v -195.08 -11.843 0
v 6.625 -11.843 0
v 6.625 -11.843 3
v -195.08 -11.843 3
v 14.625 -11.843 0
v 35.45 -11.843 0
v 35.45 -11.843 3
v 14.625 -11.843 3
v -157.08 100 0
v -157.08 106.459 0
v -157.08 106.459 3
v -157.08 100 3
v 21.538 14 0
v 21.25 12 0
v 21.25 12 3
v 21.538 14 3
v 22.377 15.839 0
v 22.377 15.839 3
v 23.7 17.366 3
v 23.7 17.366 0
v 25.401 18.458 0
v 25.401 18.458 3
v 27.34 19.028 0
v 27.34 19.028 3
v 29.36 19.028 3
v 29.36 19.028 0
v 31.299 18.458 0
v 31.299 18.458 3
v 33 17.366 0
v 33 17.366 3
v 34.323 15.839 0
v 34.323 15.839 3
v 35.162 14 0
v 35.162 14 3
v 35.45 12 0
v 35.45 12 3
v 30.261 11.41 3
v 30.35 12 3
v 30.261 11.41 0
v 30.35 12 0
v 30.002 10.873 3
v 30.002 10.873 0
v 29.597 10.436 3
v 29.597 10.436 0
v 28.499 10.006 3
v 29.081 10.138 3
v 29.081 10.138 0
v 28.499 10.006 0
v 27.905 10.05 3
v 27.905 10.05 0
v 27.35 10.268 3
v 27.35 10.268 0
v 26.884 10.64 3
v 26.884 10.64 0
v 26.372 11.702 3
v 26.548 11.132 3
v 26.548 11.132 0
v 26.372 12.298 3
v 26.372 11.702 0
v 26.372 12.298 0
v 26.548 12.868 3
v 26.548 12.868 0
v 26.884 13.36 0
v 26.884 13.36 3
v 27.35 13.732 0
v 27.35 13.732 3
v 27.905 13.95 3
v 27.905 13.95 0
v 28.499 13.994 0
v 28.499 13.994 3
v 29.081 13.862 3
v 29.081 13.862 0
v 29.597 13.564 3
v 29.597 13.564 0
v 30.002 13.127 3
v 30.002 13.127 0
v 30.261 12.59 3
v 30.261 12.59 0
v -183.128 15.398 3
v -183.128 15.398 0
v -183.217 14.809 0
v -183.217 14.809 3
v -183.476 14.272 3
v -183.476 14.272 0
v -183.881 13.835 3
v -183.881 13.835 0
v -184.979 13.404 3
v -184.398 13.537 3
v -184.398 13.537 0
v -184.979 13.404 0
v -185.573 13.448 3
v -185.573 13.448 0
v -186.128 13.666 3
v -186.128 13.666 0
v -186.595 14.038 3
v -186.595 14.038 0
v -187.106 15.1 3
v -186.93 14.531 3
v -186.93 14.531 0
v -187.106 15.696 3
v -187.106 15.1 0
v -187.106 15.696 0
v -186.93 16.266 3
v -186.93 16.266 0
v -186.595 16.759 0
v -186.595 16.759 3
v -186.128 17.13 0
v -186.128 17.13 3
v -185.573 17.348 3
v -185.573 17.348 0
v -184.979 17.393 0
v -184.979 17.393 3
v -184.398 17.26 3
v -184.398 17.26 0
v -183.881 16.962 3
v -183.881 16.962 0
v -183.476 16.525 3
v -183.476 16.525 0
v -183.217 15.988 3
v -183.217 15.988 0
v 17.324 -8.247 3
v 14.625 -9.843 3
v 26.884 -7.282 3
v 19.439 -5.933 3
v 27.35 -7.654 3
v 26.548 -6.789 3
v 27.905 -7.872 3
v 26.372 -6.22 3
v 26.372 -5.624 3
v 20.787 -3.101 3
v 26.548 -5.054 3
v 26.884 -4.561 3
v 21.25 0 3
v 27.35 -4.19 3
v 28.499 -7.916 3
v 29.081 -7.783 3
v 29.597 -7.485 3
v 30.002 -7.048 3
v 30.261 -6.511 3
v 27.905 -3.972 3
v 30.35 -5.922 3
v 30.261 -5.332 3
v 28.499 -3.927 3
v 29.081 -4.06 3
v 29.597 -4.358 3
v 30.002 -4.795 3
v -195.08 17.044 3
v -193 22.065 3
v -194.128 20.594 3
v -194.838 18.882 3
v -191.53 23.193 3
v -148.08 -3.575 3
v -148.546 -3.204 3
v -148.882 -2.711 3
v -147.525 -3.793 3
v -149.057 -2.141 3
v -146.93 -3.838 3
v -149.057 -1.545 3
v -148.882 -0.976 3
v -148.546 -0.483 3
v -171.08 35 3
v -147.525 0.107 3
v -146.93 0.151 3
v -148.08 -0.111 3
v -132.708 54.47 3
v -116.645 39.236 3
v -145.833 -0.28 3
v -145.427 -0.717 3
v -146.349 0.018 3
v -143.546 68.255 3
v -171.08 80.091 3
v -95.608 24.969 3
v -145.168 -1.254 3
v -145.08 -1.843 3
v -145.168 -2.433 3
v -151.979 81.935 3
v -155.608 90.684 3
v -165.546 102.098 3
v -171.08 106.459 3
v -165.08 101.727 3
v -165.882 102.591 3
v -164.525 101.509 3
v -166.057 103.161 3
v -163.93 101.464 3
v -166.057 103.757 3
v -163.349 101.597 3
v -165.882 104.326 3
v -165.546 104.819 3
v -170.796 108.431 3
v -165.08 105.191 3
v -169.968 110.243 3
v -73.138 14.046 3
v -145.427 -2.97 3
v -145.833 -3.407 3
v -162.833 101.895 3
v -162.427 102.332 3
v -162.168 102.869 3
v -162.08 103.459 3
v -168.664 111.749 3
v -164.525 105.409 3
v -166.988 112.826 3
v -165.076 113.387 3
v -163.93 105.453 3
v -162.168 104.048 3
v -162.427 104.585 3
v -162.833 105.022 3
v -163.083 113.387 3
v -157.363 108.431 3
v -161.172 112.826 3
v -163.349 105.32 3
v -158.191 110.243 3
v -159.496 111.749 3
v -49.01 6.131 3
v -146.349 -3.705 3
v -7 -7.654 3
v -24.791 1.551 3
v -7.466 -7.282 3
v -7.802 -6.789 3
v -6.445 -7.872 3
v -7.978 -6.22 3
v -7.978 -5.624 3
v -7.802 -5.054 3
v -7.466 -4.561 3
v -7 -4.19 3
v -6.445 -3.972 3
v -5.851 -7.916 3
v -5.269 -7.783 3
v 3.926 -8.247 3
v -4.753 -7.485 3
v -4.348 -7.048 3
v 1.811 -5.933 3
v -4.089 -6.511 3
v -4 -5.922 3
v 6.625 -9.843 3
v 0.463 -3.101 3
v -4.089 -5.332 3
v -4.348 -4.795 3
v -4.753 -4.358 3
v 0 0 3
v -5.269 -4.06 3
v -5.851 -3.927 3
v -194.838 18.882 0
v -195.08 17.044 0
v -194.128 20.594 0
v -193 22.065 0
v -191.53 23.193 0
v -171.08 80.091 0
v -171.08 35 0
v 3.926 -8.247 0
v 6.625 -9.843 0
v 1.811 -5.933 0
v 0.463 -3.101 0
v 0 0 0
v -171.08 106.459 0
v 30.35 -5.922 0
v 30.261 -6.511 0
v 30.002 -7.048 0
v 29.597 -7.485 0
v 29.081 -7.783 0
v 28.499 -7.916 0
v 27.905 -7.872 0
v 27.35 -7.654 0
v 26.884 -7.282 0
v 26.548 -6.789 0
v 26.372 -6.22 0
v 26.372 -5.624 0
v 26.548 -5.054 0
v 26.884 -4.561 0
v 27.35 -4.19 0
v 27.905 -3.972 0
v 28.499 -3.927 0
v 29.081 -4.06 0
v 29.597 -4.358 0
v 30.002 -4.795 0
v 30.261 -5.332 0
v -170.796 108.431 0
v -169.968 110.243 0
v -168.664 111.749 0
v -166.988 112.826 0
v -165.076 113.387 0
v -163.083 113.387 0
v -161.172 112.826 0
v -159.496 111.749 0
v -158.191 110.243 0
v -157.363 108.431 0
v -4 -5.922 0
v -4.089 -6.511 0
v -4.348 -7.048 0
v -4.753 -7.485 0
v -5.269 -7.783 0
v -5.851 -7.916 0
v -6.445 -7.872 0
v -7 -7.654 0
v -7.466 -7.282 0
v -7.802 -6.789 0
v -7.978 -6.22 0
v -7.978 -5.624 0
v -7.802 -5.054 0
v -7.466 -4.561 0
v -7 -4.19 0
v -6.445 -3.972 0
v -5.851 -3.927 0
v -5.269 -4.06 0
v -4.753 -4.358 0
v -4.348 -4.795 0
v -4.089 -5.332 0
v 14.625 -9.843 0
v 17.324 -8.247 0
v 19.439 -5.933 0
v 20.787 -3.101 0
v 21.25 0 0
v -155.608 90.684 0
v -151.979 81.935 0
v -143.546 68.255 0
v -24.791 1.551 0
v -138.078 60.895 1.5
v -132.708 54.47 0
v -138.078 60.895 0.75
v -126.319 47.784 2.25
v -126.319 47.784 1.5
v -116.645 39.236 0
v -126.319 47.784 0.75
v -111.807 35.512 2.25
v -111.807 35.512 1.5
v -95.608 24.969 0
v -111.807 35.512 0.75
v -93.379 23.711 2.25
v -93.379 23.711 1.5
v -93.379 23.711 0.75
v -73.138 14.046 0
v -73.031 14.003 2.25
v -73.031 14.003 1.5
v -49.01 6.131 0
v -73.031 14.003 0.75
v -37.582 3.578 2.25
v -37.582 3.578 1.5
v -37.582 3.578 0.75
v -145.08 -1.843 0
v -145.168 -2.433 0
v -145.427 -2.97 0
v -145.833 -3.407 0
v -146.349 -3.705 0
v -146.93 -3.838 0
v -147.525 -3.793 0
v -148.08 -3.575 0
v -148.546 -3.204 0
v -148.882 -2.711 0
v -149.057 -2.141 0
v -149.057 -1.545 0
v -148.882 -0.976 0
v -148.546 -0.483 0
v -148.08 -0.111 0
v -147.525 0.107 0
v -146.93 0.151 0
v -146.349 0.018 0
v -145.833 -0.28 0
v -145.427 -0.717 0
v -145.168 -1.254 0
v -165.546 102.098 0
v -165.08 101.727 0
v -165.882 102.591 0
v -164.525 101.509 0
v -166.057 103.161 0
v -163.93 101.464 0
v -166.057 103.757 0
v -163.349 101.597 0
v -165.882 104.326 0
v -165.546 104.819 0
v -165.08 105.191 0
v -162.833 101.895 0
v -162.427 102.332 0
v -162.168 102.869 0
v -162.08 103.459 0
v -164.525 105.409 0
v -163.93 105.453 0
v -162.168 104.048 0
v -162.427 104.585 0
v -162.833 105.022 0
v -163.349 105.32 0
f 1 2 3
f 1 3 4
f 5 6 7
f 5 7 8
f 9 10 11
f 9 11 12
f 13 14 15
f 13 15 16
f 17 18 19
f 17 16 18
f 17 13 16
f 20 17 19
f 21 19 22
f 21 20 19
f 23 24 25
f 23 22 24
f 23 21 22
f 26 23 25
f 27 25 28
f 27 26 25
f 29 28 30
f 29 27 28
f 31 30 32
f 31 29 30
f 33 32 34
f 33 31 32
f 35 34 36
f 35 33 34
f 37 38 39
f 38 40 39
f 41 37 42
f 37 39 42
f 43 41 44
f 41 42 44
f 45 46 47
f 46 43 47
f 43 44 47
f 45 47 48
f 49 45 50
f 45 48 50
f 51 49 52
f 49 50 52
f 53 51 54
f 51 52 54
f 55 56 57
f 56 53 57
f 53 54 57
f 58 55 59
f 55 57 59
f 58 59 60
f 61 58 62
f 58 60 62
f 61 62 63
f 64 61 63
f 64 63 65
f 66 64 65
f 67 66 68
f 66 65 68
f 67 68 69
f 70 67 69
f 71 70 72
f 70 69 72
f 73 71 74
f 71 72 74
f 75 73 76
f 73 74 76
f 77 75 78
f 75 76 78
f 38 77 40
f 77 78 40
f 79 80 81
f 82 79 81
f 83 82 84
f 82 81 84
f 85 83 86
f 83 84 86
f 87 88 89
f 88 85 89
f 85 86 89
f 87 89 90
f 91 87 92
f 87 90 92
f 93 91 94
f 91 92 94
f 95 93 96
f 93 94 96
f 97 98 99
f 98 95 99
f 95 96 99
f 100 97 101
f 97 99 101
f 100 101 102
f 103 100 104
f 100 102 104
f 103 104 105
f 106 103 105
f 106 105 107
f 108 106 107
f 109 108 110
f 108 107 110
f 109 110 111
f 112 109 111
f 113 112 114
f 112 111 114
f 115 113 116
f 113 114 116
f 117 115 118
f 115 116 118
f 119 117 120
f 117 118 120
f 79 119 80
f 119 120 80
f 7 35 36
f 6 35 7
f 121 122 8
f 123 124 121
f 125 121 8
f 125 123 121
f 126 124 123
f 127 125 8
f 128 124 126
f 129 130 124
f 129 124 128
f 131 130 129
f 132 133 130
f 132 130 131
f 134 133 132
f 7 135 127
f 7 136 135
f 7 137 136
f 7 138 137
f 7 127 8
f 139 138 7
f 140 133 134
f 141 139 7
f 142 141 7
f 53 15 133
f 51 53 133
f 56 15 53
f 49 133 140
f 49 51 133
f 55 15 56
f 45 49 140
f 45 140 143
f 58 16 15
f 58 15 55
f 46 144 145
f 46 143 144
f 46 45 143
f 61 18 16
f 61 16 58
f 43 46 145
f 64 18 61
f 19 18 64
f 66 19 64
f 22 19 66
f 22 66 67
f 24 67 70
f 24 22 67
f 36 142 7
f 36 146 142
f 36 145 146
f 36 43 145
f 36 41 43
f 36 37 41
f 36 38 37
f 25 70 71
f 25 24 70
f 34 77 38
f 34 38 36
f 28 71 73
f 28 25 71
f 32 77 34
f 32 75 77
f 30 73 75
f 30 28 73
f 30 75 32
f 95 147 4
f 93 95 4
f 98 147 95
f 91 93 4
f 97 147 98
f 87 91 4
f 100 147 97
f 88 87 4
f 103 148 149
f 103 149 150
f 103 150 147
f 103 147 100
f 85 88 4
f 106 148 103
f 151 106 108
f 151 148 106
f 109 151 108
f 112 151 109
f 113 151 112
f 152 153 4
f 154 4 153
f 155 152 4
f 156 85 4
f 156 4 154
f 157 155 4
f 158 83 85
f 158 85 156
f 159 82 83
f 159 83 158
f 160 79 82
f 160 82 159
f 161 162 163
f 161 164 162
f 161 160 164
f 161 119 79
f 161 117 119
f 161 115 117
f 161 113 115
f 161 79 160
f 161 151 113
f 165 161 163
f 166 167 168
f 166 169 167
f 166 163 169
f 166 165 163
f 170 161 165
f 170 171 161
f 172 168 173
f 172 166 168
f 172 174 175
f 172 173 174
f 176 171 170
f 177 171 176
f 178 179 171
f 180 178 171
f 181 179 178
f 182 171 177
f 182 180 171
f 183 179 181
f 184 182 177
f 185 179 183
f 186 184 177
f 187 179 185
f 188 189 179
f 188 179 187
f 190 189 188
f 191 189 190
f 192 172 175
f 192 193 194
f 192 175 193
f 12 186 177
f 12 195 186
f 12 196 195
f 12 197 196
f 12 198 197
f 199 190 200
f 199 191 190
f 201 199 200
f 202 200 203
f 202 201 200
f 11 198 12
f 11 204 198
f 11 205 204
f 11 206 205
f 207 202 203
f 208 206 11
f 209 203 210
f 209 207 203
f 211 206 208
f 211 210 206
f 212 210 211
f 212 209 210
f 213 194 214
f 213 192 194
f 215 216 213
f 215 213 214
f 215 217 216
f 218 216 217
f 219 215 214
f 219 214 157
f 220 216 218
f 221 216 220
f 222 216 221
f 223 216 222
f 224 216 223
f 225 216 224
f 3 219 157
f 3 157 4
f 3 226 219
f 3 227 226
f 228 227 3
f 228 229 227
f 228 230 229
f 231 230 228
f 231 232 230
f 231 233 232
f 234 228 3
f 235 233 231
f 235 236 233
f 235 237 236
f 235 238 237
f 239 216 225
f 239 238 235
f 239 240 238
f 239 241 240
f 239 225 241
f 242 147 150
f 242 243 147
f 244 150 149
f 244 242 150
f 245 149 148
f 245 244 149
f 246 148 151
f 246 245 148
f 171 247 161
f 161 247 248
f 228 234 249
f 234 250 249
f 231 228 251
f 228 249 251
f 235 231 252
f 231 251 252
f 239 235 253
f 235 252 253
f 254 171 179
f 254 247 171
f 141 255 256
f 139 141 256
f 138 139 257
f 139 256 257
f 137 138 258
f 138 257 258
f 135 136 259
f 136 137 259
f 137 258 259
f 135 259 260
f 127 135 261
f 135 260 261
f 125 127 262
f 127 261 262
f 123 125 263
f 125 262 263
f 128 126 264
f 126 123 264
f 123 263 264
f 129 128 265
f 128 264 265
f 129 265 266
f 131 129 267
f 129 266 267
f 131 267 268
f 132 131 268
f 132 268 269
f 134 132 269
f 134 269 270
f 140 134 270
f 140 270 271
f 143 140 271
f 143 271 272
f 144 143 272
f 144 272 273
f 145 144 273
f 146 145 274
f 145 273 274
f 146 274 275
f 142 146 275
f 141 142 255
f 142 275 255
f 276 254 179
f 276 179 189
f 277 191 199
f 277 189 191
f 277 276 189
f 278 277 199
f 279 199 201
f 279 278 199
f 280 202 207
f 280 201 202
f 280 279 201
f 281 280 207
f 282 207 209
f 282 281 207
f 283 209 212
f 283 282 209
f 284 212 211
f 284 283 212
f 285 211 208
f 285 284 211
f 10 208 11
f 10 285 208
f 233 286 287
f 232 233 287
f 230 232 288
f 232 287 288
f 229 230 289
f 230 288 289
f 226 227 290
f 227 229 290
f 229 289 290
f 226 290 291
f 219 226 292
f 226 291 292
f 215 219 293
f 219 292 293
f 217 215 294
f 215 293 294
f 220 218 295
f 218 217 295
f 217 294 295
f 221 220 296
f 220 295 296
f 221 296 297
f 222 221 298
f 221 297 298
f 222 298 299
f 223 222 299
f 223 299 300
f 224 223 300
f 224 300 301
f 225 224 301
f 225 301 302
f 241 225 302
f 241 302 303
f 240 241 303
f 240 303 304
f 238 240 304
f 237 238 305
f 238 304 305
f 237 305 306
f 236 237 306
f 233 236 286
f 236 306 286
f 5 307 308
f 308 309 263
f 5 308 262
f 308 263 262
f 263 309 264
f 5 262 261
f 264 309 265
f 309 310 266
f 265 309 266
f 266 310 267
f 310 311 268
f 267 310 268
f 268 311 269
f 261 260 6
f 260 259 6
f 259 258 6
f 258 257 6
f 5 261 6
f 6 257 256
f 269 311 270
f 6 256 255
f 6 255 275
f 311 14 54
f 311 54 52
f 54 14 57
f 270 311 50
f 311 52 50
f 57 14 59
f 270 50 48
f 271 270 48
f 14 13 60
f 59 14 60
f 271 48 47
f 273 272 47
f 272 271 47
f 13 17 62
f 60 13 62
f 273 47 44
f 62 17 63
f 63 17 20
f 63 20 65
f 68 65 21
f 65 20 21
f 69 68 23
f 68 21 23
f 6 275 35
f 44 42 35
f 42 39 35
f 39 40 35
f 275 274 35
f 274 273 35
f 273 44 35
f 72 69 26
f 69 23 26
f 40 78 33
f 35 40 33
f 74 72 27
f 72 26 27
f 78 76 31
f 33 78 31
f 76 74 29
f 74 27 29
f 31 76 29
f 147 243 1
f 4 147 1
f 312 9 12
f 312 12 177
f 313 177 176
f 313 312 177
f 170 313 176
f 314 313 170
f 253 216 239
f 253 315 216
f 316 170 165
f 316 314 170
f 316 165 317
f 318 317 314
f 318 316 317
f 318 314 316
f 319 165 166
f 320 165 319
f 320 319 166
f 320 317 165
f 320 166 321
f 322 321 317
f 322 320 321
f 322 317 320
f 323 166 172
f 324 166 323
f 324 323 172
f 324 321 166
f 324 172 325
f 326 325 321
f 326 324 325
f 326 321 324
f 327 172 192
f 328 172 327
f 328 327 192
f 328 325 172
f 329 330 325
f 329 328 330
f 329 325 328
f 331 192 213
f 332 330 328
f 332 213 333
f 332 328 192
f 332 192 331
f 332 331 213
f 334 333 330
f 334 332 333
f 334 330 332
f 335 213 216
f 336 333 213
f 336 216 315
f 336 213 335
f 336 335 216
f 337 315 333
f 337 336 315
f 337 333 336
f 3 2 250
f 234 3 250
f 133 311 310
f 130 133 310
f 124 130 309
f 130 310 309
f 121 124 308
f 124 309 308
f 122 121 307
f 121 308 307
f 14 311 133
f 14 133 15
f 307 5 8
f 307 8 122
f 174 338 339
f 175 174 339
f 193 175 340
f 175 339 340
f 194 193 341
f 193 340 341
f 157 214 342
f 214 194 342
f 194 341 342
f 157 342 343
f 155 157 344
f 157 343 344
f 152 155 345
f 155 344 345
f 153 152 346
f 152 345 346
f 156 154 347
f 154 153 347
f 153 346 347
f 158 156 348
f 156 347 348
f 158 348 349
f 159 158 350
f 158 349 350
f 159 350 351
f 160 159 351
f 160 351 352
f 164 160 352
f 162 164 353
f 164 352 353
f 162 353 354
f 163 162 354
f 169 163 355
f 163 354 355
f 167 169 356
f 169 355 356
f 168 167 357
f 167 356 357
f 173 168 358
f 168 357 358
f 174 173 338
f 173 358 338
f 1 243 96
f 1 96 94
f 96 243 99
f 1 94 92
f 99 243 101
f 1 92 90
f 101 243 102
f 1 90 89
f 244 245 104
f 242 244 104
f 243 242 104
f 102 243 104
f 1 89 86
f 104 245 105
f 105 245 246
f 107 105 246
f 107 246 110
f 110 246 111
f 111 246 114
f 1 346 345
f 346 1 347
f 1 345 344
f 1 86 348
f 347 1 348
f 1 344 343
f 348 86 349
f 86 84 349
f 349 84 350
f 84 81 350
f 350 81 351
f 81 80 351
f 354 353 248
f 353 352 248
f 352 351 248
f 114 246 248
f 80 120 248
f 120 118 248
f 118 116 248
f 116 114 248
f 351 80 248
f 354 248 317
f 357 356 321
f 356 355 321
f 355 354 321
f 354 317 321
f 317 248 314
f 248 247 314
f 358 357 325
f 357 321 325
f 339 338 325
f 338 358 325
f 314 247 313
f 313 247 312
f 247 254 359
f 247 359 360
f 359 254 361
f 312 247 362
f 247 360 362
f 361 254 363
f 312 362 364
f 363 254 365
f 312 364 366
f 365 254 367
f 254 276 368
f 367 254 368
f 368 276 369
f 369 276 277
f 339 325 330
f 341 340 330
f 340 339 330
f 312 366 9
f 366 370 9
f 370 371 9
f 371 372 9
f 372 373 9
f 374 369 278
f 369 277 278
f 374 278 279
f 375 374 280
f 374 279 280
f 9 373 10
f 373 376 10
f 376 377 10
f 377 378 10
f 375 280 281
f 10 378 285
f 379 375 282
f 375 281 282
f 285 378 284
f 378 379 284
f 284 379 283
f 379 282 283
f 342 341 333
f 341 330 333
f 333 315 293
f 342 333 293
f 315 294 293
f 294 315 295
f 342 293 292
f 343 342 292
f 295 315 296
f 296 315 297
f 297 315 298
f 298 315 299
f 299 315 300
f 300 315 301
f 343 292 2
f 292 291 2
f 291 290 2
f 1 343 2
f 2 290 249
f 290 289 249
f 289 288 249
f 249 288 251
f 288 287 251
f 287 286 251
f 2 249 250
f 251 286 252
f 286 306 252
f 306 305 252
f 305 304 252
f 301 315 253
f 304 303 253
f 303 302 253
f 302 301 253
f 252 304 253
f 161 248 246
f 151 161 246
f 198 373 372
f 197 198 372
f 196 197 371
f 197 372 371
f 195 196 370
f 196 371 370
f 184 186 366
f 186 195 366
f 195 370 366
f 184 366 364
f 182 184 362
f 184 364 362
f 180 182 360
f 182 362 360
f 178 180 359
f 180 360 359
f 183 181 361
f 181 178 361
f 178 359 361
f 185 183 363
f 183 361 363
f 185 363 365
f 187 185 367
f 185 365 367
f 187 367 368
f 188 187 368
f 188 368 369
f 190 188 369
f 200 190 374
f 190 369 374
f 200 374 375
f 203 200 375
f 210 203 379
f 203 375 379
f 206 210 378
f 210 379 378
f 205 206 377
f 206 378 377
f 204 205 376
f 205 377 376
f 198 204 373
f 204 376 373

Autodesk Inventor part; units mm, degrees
ref_plane "YZ Plane" through (0, 0, 0) normal (1, 0, 0) x (0, 1, 0)
ref_plane "XZ Plane" through (0, 0, 0) normal (0, 1, 0) x (-1, 0, 0)
ref_plane "XY Plane" through (0, 0, 0) normal (0, 0, 1) x (1, 0, 0)
sketch "Sketch3" plane through (0, 0, 0) normal (0, 0, 1) x (1, 0, 0)
  circle A0 centre (367.816, 50) radius 50 construction
  line L0 (367.816, 0) -> (512.7041, 0) construction
  line L1 (367.816, 50) -> (512.7041, 50) construction
  line L2 (367.816, 100) -> (512.7041, 100) construction
  line L3 (367.816, 50) -> (342.816, 6.6987) construction
  line L4 (367.816, 50) -> (324.5147, 25) construction
  line L5 (367.816, 50) -> (324.5147, 75) construction
  line L6 (342.816, 93.3013) -> (367.816, 50) construction
  line L7 (392.816, 93.3013) -> (367.816, 50) construction
  line L8 (411.1173, 75) -> (367.816, 50) construction
  line L9 (411.1173, 25) -> (367.816, 50) construction
  line L10 (392.816, 6.6987) -> (367.816, 50) construction
  line L11 (367.816, 0) -> (367.816, 100) construction
  line L12 (417.816, 50) -> (367.816, 50) construction
  line L13 (341.6361, 0) -> (341.6361, 100) construction
  line L14 (315.4561, 0) -> (315.4561, 100) construction
  line L15 (289.2762, 0) -> (289.2762, 100) construction
  line L16 (263.0963, 0) -> (263.0963, 100) construction
  line L17 (236.9163, 0) -> (236.9163, 100) construction
  line L18 (210.7364, 0) -> (210.7364, 100) construction
  line L19 (184.5564, 0) -> (184.5564, 100) construction
  line L20 (158.3765, 0) -> (158.3765, 100) construction
  circle A1 centre (315.4561, 50) radius 50 construction
  circle A2 centre (341.6361, 50) radius 50 construction
  circle A3 centre (289.2762, 50) radius 50 construction
  circle A4 centre (263.0963, 50) radius 50 construction
  circle A5 centre (236.9163, 50) radius 50 construction
  circle A6 centre (210.7364, 50) radius 50 construction
  line L21 (392.816, 6.6987) -> (512.7041, 6.6987) construction
  line L22 (411.1173, 25) -> (512.7041, 25) construction
  line L23 (411.1173, 75) -> (512.7041, 75) construction
  line L24 (411.1173, 75) -> (512.7041, 75) construction
  line L25 (392.816, 93.3013) -> (512.7041, 93.3013) construction
  line L26 (358.7574, 75) -> (339.2762, 50) construction
  line L27 (339.2762, 50) -> (306.3975, 25) construction
  line L28 (306.3975, 25) -> (261.9163, 6.6987) construction
  line L29 (261.9163, 6.6987) -> (210.7364, 0) construction
  line L30 (105.3682, -12.9392) -> (105.3682, 124.4333) construction
  line L31 (21.25, 0) -> (21.25, 12)
  line L32 (35.45, 12) -> (35.45, -11.8433)
  arc A7 (0, 0) -> (6.625, -9.8433) centre (10.625, 0) ccw
  arc A8 (14.625, -9.8433) -> (21.25, 0) centre (10.625, 0) ccw
  line L33 (35.45, -11.8433) -> (14.625, -11.8433)
  line L34 (6.625, -11.8433) -> (-195.0796, -11.8433)
  circle A9 centre (-144.26, 100.8473) radius 12.875 construction
  line L35 (6.625, -11.8433) -> (6.625, -9.8433)
  line L36 (14.625, -11.8433) -> (14.625, -9.8433)
  line L37 (411.1173, 75) -> (158.3765, 75) construction
  line L38 (367.816, 100) -> (158.3765, 100) construction
  line L39 (417.816, 50) -> (158.3765, 50) construction
  line L40 (411.1173, 25) -> (158.3765, 25) construction
  line L41 (392.816, 6.6987) -> (158.3765, 6.6987) construction
  line L42 (392.816, 93.3013) -> (158.3765, 93.3013) construction
  line L43 (358.7574, 75) -> (366.6361, 93.3013) construction
  line L44 (366.6361, 93.3013) -> (367.816, 100) construction
  spline S0 degree 4 poles (-157.0796, 100) (-157.0796, 88.9946) (-147.011, 72.6811) (-131.8577, 48.7932) (-88.4777, 17.6268) (-50.0176, 3.937) (-18.8717, 0) (0, 0) knots 0 0 0 0 0 0.264547 0.457223 0.66608 1 1 1 1 1
  line L45 (-157.0796, 100) -> (-157.0796, 38) construction
  line L46 (0, 0) -> (-157.0796, 0) construction
  line L47 (-144.26, 100.8473) -> (-157.135, 100.8473) construction
  circle A10 centre (-146.4546, 100) radius 10.625 construction
  line L48 (-146.4546, 100) -> (-157.0796, 100) construction
  line L49 (-141.0754, 84.4005) -> (-135.6205, 93.5183) construction
  line L50 (-141.0796, 132.0528) -> (-171.0796, 149.3733) construction
  line L51 (-171.0796, 149.3733) -> (-201.0796, 132.0528) construction
  line L52 (-141.0754, 84.4005) -> (-99.2801, 84.4005) construction
  line L53 (-201.0796, 132.0528) -> (-201.0796, 97.4118) construction
  line L54 (-201.0796, 97.4118) -> (-171.0796, 80.0913) construction
  line L55 (0, 0) -> (-157.0796, 93.9753) construction
  line L56 (-135.6205, 93.5183) -> (-137.3368, 94.5451) construction
  line L57 (-137.3368, 94.5451) -> (-143.2815, 84.6085) construction
  line L58 (-137.3368, 94.5451) -> (-171.0796, 114.7323) construction
  line L59 (-201.0796, 132.0528) -> (-171.0796, 114.7323) construction
  arc A11 (-137.3368, 94.5451) -> (-144.7045, 143.8948) centre (-171.0796, 114.7323) ccw construction
  arc A12 (-142.7917, 85.4273) -> (-147.1443, 147.6882) centre (-171.0796, 114.7323) ccw construction
  line L60 (-171.0796, 80.0913) -> (-171.0796, 35)
  circle A13 centre (-171.0796, 114.7323) radius 2.5 construction
  arc A14 (-167.4345, 120.8251) -> (-174.7248, 108.6394) centre (-171.0796, 114.7323) ccw construction
  line L61 (-167.4345, 120.8251) -> (-157.0796, 114.6302) construction
  line L62 (-171.0796, 80.0913) -> (-171.0796, 106.4587)
  line L63 (-171.0796, 106.4587) -> (-174.7248, 108.6394) construction
  line L64 (-171.0796, 35) -> (-191.5296, 23.1932)
  arc A15 (-191.5296, 23.1932) -> (-195.0796, 17.0444) centre (-187.9796, 17.0444) ccw
  line L65 (-195.0796, 17.0444) -> (-195.0796, -11.8433)
  arc A16 (35.45, 12) -> (21.25, 12) centre (28.35, 12) ccw
  line L66 (-157.0796, 114.6302) -> (-157.0796, 99.9865) construction
  circle A17 centre (-164.0796, 103.4587) radius 2
  line L67 (-171.0796, 103.4587) -> (-157.0796, 103.4587) construction
  circle A18 centre (-185.1284, 15.3983) radius 2
  line L68 (-185.1284, 15.3983) -> (-194.1284, 20.5944) construction
  circle A19 centre (-6, -5.9217) radius 2
  line L69 (-6, -11.8433) -> (-6, 0) construction
  circle A20 centre (28.35, 12) radius 2
  circle A21 centre (28.35, -5.9217) radius 2
  line L70 (-167.4345, 320.8251) -> (-157.0796, 314.6302) construction
  arc A22 (-167.4345, 320.8251) -> (-174.7248, 308.6394) centre (-171.0796, 314.7323) ccw construction
  circle A23 centre (-171.0796, 314.7323) radius 2.5 construction
  line L71 (-171.0796, 280.0913) -> (-171.0796, 306.4587)
  line L72 (-171.0796, 306.4587) -> (-174.7248, 308.6394) construction
  line L73 (-157.0796, 314.6302) -> (-157.0796, 299.9865) construction
  circle A24 centre (-164.0796, 303.4587) radius 2
  spline S1 degree 4 poles (-157.0796, 300) (-157.0796, 288.9946) (-147.0234, 272.6841) (-124.1789, 236.7977) (-70.8039, 208.0704) (-31.8865, 200.2943) (0, 200) knots 0 0 0 0 0 0.264547 0.457223 1 1 1 1 1 construction
  line L74 (-157.0796, 300) -> (-157.0796, 238) construction
  arc A25 (0, 200) -> (6.625, 190.1567) centre (10.625, 200) ccw
  line L75 (35.45, 212) -> (35.45, 188.1567)
  circle A26 centre (28.35, 212) radius 2
  circle A27 centre (28.35, 194.0783) radius 2
  arc A28 (35.45, 212) -> (21.25, 212) centre (28.35, 212) ccw
  line L76 (21.25, 200) -> (21.25, 212)
  line L77 (35.45, 188.1567) -> (14.625, 188.1567)
  arc A29 (14.625, 190.1567) -> (21.25, 200) centre (10.625, 200) ccw
  line L78 (14.625, 188.1567) -> (14.625, 190.1567)
  line L79 (-185.1284, 215.3983) -> (-194.1284, 220.5944) construction
  arc A30 (-191.5296, 223.1932) -> (-195.0796, 217.0444) centre (-187.9796, 217.0444) ccw
  line L80 (-195.0796, 217.0444) -> (-195.0796, 188.1567)
  line L81 (-171.0796, 235) -> (-191.5296, 223.1932)
  circle A31 centre (-185.1284, 215.3983) radius 2
  line L82 (-171.0796, 280.0913) -> (-171.0796, 235)
  line L83 (6.625, 188.1567) -> (-195.0796, 188.1567)
  line L84 (6.625, 188.1567) -> (6.625, 190.1567)
  line L85 (-137.3368, 294.5451) -> (-143.2815, 284.6085) construction
  line L86 (-141.0754, 284.4005) -> (-135.6205, 293.5183) construction
  line L87 (0, 200) -> (-157.0796, 293.9753)
  line L88 (-167.4345, 520.8251) -> (-157.0796, 514.6302) construction
  arc A32 (-167.4345, 520.8251) -> (-174.7248, 508.6394) centre (-171.0796, 514.7323) ccw construction
  circle A33 centre (-171.0796, 514.7323) radius 2.5 construction
  line L89 (-171.0796, 480.0913) -> (-171.0796, 506.4587)
  line L90 (-171.0796, 506.4587) -> (-174.7248, 508.6394) construction
  line L91 (-157.0796, 514.6302) -> (-157.0796, 499.9865) construction
  circle A34 centre (-164.0796, 503.4587) radius 2
  spline S2 degree 4 poles (-157.0796, 500) (-157.0796, 488.9946) (-147.0234, 472.6841) (-124.1789, 436.7977) (-70.8039, 408.0704) (-31.8865, 400.2943) (0, 400) knots 0 0 0 0 0 0.264547 0.457223 1 1 1 1 1 construction
  line L92 (-157.0796, 500) -> (-157.0796, 438)
  arc A35 (0, 400) -> (6.625, 390.1567) centre (10.625, 400) ccw
  line L93 (35.45, 412) -> (35.45, 388.1567)
  circle A36 centre (28.35, 412) radius 2
  circle A37 centre (28.35, 394.0783) radius 2
  arc A38 (35.45, 412) -> (21.25, 412) centre (28.35, 412) ccw
  line L94 (21.25, 400) -> (21.25, 412)
  line L95 (35.45, 388.1567) -> (14.625, 388.1567)
  arc A39 (14.625, 390.1567) -> (21.25, 400) centre (10.625, 400) ccw
  line L96 (14.625, 388.1567) -> (14.625, 390.1567)
  line L97 (-185.1284, 415.3983) -> (-194.1284, 420.5944) construction
  arc A40 (-191.5296, 423.1932) -> (-195.0796, 417.0444) centre (-187.9796, 417.0444) ccw
  line L98 (-195.0796, 417.0444) -> (-195.0796, 388.1567)
  line L99 (-171.0796, 435) -> (-191.5296, 423.1932)
  circle A41 centre (-185.1284, 415.3983) radius 2
  line L100 (-171.0796, 480.0913) -> (-171.0796, 435)
  line L101 (6.625, 388.1567) -> (-195.0796, 388.1567)
  line L102 (6.625, 388.1567) -> (6.625, 390.1567)
  line L103 (-137.3368, 494.5451) -> (-143.2815, 484.6085) construction
  line L104 (-141.0754, 484.4005) -> (-135.6205, 493.5183) construction
  line L105 (0, 400) -> (-157.0796, 493.9753) construction
  line L106 (-467.4345, 120.8251) -> (-457.0796, 114.6302) construction
  arc A42 (-467.4345, 120.8251) -> (-474.7248, 108.6394) centre (-471.0796, 114.7323) ccw construction
  circle A43 centre (-471.0796, 114.7323) radius 2.5 construction
  line L107 (-471.0796, 80.0913) -> (-471.0796, 106.4587)
  line L108 (-471.0796, 106.4587) -> (-474.7248, 108.6394) construction
  line L109 (-457.0796, 114.6302) -> (-457.0796, 99.9865) construction
  circle A44 centre (-464.0796, 103.4587) radius 2
  spline S3 degree 4 poles (-457.0796, 100) (-457.0796, 88.9946) (-447.0234, 72.6841) (-424.1789, 36.7977) (-370.8039, 8.0704) (-331.8865, 0.2943) (-300, 0) knots 0 0 0 0 0 0.264547 0.457223 1 1 1 1 1 construction
  line L110 (-457.0796, 100) -> (-457.0796, 38) construction
  arc A45 (-300, 0) -> (-293.375, -9.8433) centre (-289.375, 0) ccw construction
  line L111 (-264.55, 12) -> (-264.55, -11.8433)
  circle A46 centre (-271.65, 12) radius 2
  circle A47 centre (-271.65, -5.9217) radius 2
  arc A48 (-264.55, 12) -> (-278.75, 12) centre (-271.65, 12) ccw
  line L112 (-278.75, 0) -> (-278.75, 12) construction
  line L113 (-264.55, -11.8433) -> (-285.375, -11.8433)
  arc A49 (-285.375, -9.8433) -> (-278.75, 0) centre (-289.375, 0) ccw construction
  line L114 (-285.375, -11.8433) -> (-285.375, -9.8433) construction
  line L115 (-485.1284, 15.3983) -> (-494.1284, 20.5944) construction
  arc A50 (-491.5296, 23.1932) -> (-495.0796, 17.0444) centre (-487.9796, 17.0444) ccw
  line L116 (-495.0796, 17.0444) -> (-495.0796, -11.8433)
  line L117 (-471.0796, 35) -> (-491.5296, 23.1932)
  circle A51 centre (-485.1284, 15.3983) radius 2
  line L118 (-471.0796, 80.0913) -> (-471.0796, 35)
  line L119 (-293.375, -11.8433) -> (-495.0796, -11.8433)
  line L120 (-293.375, -11.8433) -> (-293.375, -9.8433) construction
  line L121 (-437.3368, 94.5451) -> (-443.2815, 84.6085) construction
  line L122 (-441.0754, 84.4005) -> (-435.6205, 93.5183) construction
  line L123 (-300, 0) -> (-457.0796, 93.9753) construction
  line L124 (-467.4345, 320.8251) -> (-457.0796, 314.6302) construction
  arc A52 (-467.4345, 320.8251) -> (-474.7248, 308.6394) centre (-471.0796, 314.7323) ccw construction
  circle A53 centre (-471.0796, 314.7323) radius 2.5 construction
  line L125 (-471.0796, 280.0913) -> (-471.0796, 306.4587)
  line L126 (-471.0796, 306.4587) -> (-474.7248, 308.6394) construction
  line L127 (-457.0796, 314.6302) -> (-457.0796, 299.9865) construction
  circle A54 centre (-464.0796, 303.4587) radius 2
  spline S4 degree 4 poles (-457.0796, 300) (-457.0796, 288.9946) (-447.0234, 272.6841) (-424.1789, 236.7977) (-370.8039, 208.0704) (-331.8865, 200.2943) (-300, 200) knots 0 0 0 0 0 0.264547 0.457223 1 1 1 1 1 construction
  line L128 (-457.0796, 300) -> (-457.0796, 238) construction
  arc A55 (-300, 200) -> (-293.375, 190.1567) centre (-289.375, 200) ccw construction
  line L129 (-264.55, 212) -> (-264.55, 188.1567)
  circle A56 centre (-271.65, 212) radius 2
  circle A57 centre (-271.65, 194.0783) radius 2
  arc A58 (-264.55, 212) -> (-278.75, 212) centre (-271.65, 212) ccw
  line L130 (-278.75, 200) -> (-278.75, 212) construction
  line L131 (-264.55, 188.1567) -> (-285.375, 188.1567)
  arc A59 (-285.375, 190.1567) -> (-278.75, 200) centre (-289.375, 200) ccw construction
  line L132 (-285.375, 188.1567) -> (-285.375, 190.1567) construction
  line L133 (-485.1284, 215.3983) -> (-494.1284, 220.5944) construction
  arc A60 (-491.5296, 223.1932) -> (-495.0796, 217.0444) centre (-487.9796, 217.0444) ccw
  line L134 (-495.0796, 217.0444) -> (-495.0796, 188.1567)
  line L135 (-471.0796, 235) -> (-491.5296, 223.1932)
  circle A61 centre (-485.1284, 215.3983) radius 2
  line L136 (-471.0796, 280.0913) -> (-471.0796, 235)
  line L137 (-293.375, 188.1567) -> (-495.0796, 188.1567)
  line L138 (-293.375, 188.1567) -> (-293.375, 190.1567) construction
  line L139 (-437.3368, 294.5451) -> (-443.2815, 284.6085) construction
  line L140 (-441.0754, 284.4005) -> (-435.6205, 293.5183) construction
  line L141 (-300, 200) -> (-457.0796, 293.9753) construction
  line L142 (-467.4345, 520.8251) -> (-457.0796, 514.6302)
  arc A62 (-467.4345, 520.8251) -> (-474.7248, 508.6394) centre (-471.0796, 514.7323) ccw
  circle A63 centre (-471.0796, 514.7323) radius 2.5
  line L143 (-471.0796, 480.0913) -> (-471.0796, 506.4587)
  line L144 (-471.0796, 506.4587) -> (-474.7248, 508.6394)
  line L145 (-457.0796, 514.6302) -> (-457.0796, 499.9865)
  circle A64 centre (-464.0796, 503.4587) radius 2
  spline S5 degree 4 poles (-457.0796, 500) (-457.0796, 488.9946) (-447.0234, 472.6841) (-424.1789, 436.7977) (-370.8039, 408.0704) (-331.8865, 400.2943) (-300, 400) knots 0 0 0 0 0 0.264547 0.457223 1 1 1 1 1 construction
  line L146 (-457.0796, 500) -> (-457.0796, 438) construction
  arc A65 (-300, 400) -> (-293.375, 390.1567) centre (-289.375, 400) ccw construction
  line L147 (-264.55, 412) -> (-264.55, 388.1567) construction
  circle A66 centre (-271.65, 412) radius 2
  circle A67 centre (-271.65, 394.0783) radius 2
  arc A68 (-264.55, 412) -> (-278.75, 412) centre (-271.65, 412) ccw
  line L148 (-278.75, 400) -> (-278.75, 412) construction
  line L149 (-264.55, 388.1567) -> (-285.375, 388.1567)
  arc A69 (-285.375, 390.1567) -> (-278.75, 400) centre (-289.375, 400) ccw construction
  line L150 (-285.375, 388.1567) -> (-285.375, 390.1567) construction
  line L151 (-485.1284, 415.3983) -> (-494.1284, 420.5944) construction
  arc A70 (-491.5296, 423.1932) -> (-495.0796, 417.0444) centre (-487.9796, 417.0444) ccw
  line L152 (-495.0796, 417.0444) -> (-495.0796, 388.1567) construction
  line L153 (-471.0796, 435) -> (-491.5296, 423.1932)
  circle A71 centre (-485.1284, 415.3983) radius 2
  line L154 (-471.0796, 480.0913) -> (-471.0796, 435)
  line L155 (-293.375, 388.1567) -> (-495.0796, 388.1567)
  line L156 (-293.375, 388.1567) -> (-293.375, 390.1567) construction
  line L157 (-437.3368, 494.5451) -> (-443.2815, 484.6085) construction
  line L158 (-441.0754, 484.4005) -> (-435.6205, 493.5183) construction
  line L159 (-300, 400) -> (-457.0796, 493.9753) construction
  line L160 (-435.4304, 87.048) -> (-430.3073, 83.9831)
  line L161 (-430.3073, 83.9831) -> (-430.3073, 78.0131)
  line L162 (-457.0796, 100) -> (-443.128, 91.6532)
  line L163 (-443.2208, 85.684) -> (-443.128, 91.6532)
  line L164 (-440.6463, 84.1438) -> (-435.4304, 87.048)
  line L165 (-440.6463, 84.1438) -> (-443.2208, 85.684)
  line L166 (-430.3073, 78.0131) -> (-436.0283, 74.7101)
  line L167 (-436.0283, 74.7101) -> (-436.0283, 68.1041)
  spline S6 degree 4 poles (-439.3753, 72.7777) (-420.1522, 45.3403) (-398.6357, 22.4496) (-337.1208, 4.2654) (-300, 5.1701) knots 0 0 0 0 0 1 1 1 1 1
  line L168 (-293.375, -11.8433) -> (-285.375, -11.8433)
  line L169 (-157.0796, 293.9753) -> (-157.0796, 300)
  line L170 (-293.375, 188.1567) -> (-285.375, 188.1567)
  arc A72 (-157.0796, 438) -> (-119.0796, 400) centre (-119.0796, 438) ccw
  line L171 (-119.0796, 400) -> (0, 400)
  line L172 (-457.0796, 500) -> (-457.0796, 438) construction
  line L173 (-419.0796, 400) -> (-300, 400) construction
  arc A73 (-457.0796, 438) -> (-419.0796, 400) centre (-419.0796, 438) ccw construction
  line L174 (-457.0796, 300) -> (-443.128, 291.6532)
  line L175 (-443.2208, 285.684) -> (-443.128, 291.6532)
  line L176 (-440.6463, 284.1438) -> (-443.2208, 285.684)
  line L177 (-440.6463, 284.1438) -> (-435.4304, 287.048)
  line L178 (-435.4304, 287.048) -> (-430.3073, 283.9831)
  line L179 (-430.3073, 283.9831) -> (-430.3073, 278.0131) construction
  line L180 (-430.3073, 278.0131) -> (-436.0283, 274.7101) construction
  line L181 (-457.0796, 500) -> (-443.128, 491.6532)
  line L182 (-443.2208, 485.684) -> (-443.128, 491.6532)
  line L183 (-440.6463, 484.1438) -> (-443.2208, 485.684)
  line L184 (-440.6463, 484.1438) -> (-435.4304, 487.048)
  line L185 (-435.4304, 487.048) -> (-430.3073, 483.9831)
  line L186 (-430.3073, 483.9831) -> (-430.3073, 478.0131)
  line L187 (-430.3073, 478.0131) -> (-436.0283, 474.7101)
  line L188 (-430.3073, 283.9831) -> (-298.5715, 205.1701)
  line L189 (-293.375, 388.1567) -> (-285.375, 388.1567)
  line L190 (-300, 5.1701) -> (-285.5799, 5.1701)
  arc A74 (-285.5799, 5.1701) -> (-278.75, 12) centre (-285.5799, 12) ccw
  line L191 (-298.5715, 205.1701) -> (-285.5799, 205.1701)
  arc A75 (-285.5799, 205.1701) -> (-278.75, 212) centre (-285.5799, 212) ccw
  line L192 (-436.0283, 474.7101) -> (-451.9095, 465.5411)
  line L193 (-451.9095, 465.5411) -> (-451.9095, 438)
  arc A76 (-451.9095, 438) -> (-419.0796, 405.1701) centre (-419.0796, 438) ccw
  line L194 (-419.0796, 405.1701) -> (-285.5799, 405.1701)
  arc A77 (-285.5799, 405.1701) -> (-278.75, 412) centre (-285.5799, 412) ccw
  line L195 (-495.0796, 388.1567) -> (-514.2796, 388.1567)
  line L196 (-514.2796, 388.1567) -> (-514.2796, 392.1567)
  line L197 (-514.2796, 392.1567) -> (-498.0796, 392.1567)
  arc A78 (-498.0796, 392.1567) -> (-495.0796, 395.1567) centre (-498.0796, 395.1567) ccw
  line L198 (-495.0796, 395.1567) -> (-495.0796, 417.0444)
  line L199 (-499.0796, 388.1567) -> (-510.2796, 388.1567) construction
  line L200 (-510.2796, 388.1567) -> (-510.2796, 392.1567) construction
  line L201 (-510.2796, 392.1567) -> (-499.0796, 392.1567) construction
  line L202 (-499.0796, 392.1567) -> (-499.0796, 388.1567) construction
  line L203 (-499.0796, 388.1567) -> (-510.2796, 392.1567) construction
  line L204 (-510.2796, 388.1567) -> (-499.0796, 392.1567) construction
  arc A79 (-600, 200) -> (-593.375, 190.1567) centre (-589.375, 200) ccw construction
  line L205 (-564.55, 212) -> (-564.55, 188.1567) construction
  circle A80 centre (-571.65, 212) radius 2
  circle A81 centre (-571.65, 194.0783) radius 2
  arc A82 (-564.55, 212) -> (-578.75, 212) centre (-571.65, 212) ccw
  line L206 (-578.75, 200) -> (-578.75, 212) construction
  line L207 (-564.55, 188.1567) -> (-585.375, 188.1567)
  arc A83 (-585.375, 190.1567) -> (-578.75, 200) centre (-589.375, 200) ccw construction
  line L208 (-585.375, 188.1567) -> (-585.375, 190.1567) construction
  line L209 (-593.375, 188.1567) -> (-593.375, 190.1567) construction
  arc A84 (-585.5799, 205.1701) -> (-578.75, 212) centre (-585.5799, 212) ccw
  line L210 (-593.375, 188.1567) -> (-585.375, 188.1567)
  line L211 (-598.5715, 205.1701) -> (-585.5799, 205.1701)
  arc A85 (-791.5296, 223.1932) -> (-795.0796, 217.0444) centre (-787.9796, 217.0444) ccw
  line L212 (-785.1284, 215.3983) -> (-794.1284, 220.5944) construction
  circle A86 centre (-785.1284, 215.3983) radius 2
  line L213 (-771.0796, 235) -> (-791.5296, 223.1932)
  line L214 (-795.0796, 217.0444) -> (-795.0796, 188.1567) construction
  line L215 (-730.3073, 278.0131) -> (-736.0283, 274.7101) construction
  line L216 (-757.0796, 300) -> (-757.0796, 238) construction
  line L217 (-730.3073, 283.9831) -> (-730.3073, 278.0131) construction
  line L218 (-730.3073, 283.9831) -> (-598.5715, 205.1701)
  line L219 (-600, 200) -> (-757.0796, 293.9753) construction
  spline S7 degree 4 poles (-757.0796, 300) (-757.0796, 288.9946) (-747.0234, 272.6841) (-724.1789, 236.7977) (-670.8039, 208.0704) (-631.8865, 200.2943) (-600, 200) knots 0 0 0 0 0 0.264547 0.457223 1 1 1 1 1 construction
  line L220 (-593.375, 188.1567) -> (-795.0796, 188.1567)
  line L221 (-771.0796, 280.0913) -> (-771.0796, 235)
  line L222 (-757.0796, 300) -> (-743.128, 291.6532)
  line L223 (-743.2208, 285.684) -> (-743.128, 291.6532)
  line L224 (-740.6463, 284.1438) -> (-743.2208, 285.684)
  line L225 (-737.3368, 294.5451) -> (-743.2815, 284.6085) construction
  line L226 (-741.0754, 284.4005) -> (-735.6205, 293.5183) construction
  line L227 (-740.6463, 284.1438) -> (-735.4304, 287.048)
  line L228 (-735.4304, 287.048) -> (-730.3073, 283.9831)
  line L229 (-767.4345, 320.8251) -> (-757.0796, 314.6302)
  line L230 (-771.0796, 280.0913) -> (-771.0796, 306.4587)
  line L231 (-757.0796, 314.6302) -> (-757.0796, 299.9865)
  circle A87 centre (-764.0796, 303.4587) radius 2
  line L232 (-771.0796, 306.4587) -> (-774.7248, 308.6394)
  circle A88 centre (-771.0796, 314.7323) radius 2.5
  arc A89 (-767.4345, 320.8251) -> (-774.7248, 308.6394) centre (-771.0796, 314.7323) ccw
  line L233 (-795.0796, 188.1567) -> (-814.2796, 188.1567)
  line L234 (-814.2796, 188.1567) -> (-814.2796, 192.1567)
  line L235 (-814.2796, 192.1567) -> (-798.0796, 192.1567)
  arc A90 (-798.0796, 192.1567) -> (-795.0796, 195.1567) centre (-798.0796, 195.1567) ccw
  line L236 (-795.0796, 195.1567) -> (-795.0796, 217.0444)
  line L237 (-799.0796, 188.1567) -> (-810.2796, 188.1567) construction
  line L238 (-810.2796, 188.1567) -> (-810.2796, 192.1567) construction
  line L239 (-810.2796, 192.1567) -> (-799.0796, 192.1567) construction
  line L240 (-799.0796, 192.1567) -> (-799.0796, 188.1567) construction
  line L241 (-799.0796, 188.1567) -> (-810.2796, 192.1567) construction
  line L242 (-810.2796, 188.1567) -> (-799.0796, 192.1567) construction
  line L243 (-495.0796, 587.6927) -> (-264.55, 587.6927) construction
  line L244 (-379.8148, 587.6927) -> (-379.8148, 614.3146) construction
  line L245 (-795.0796, 438) -> (-564.55, 438) construction
  line L246 (-679.8148, 438) -> (-679.8148, 492.8294) construction
  arc A91 (-564.55, 195.1567) -> (-561.55, 192.1567) centre (-561.55, 195.1567) ccw
  line L247 (-545.35, 192.1567) -> (-561.55, 192.1567)
  line L248 (-545.35, 188.1567) -> (-545.35, 192.1567)
  line L249 (-560.55, 192.1567) -> (-560.55, 188.1567) construction
  line L250 (-560.55, 188.1567) -> (-549.35, 188.1567) construction
  line L251 (-564.55, 188.1567) -> (-545.35, 188.1567)
  line L252 (-549.35, 188.1567) -> (-549.35, 192.1567) construction
  line L253 (-549.35, 192.1567) -> (-560.55, 192.1567) construction
  line L254 (-560.55, 188.1567) -> (-549.35, 192.1567) construction
  line L255 (-549.35, 188.1567) -> (-560.55, 192.1567) construction
  line L256 (-564.55, 195.1567) -> (-564.55, 212)
  circle A92 centre (-147.0796, 398.1567) radius 2
  circle A93 centre (-147.0796, 198.1567) radius 2
  circle A94 centre (-147.0796, -1.8433) radius 2
  circle A95 centre (-447.0796, 398.1567) radius 2
  circle A96 centre (-447.0796, 198.1567) radius 2
  circle A97 centre (-447.0796, -1.8433) radius 2
  circle A98 centre (-747.0796, 398.1567) radius 2 construction
  circle A99 centre (-747.0796, 198.1567) radius 2
  circle A100 centre (-747.0796, -1.8433) radius 2 construction
  line L257 (-264.55, 388.1567) -> (-245.35, 388.1567)
  line L258 (-245.35, 388.1567) -> (-245.35, 392.1567)
  line L259 (-245.35, 392.1567) -> (-261.55, 392.1567)
  arc A101 (-264.55, 395.1567) -> (-261.55, 392.1567) centre (-261.55, 395.1567) ccw
  line L260 (-260.55, 388.1567) -> (-249.35, 388.1567) construction
  line L261 (-249.35, 388.1567) -> (-249.35, 392.1567) construction
  line L262 (-249.35, 392.1567) -> (-260.55, 392.1567) construction
  line L263 (-260.55, 392.1567) -> (-260.55, 388.1567) construction
  line L264 (-260.55, 388.1567) -> (-249.35, 392.1567) construction
  line L265 (-249.35, 388.1567) -> (-260.55, 392.1567) construction
  line L266 (-264.55, 412) -> (-264.55, 395.1567)
  arc A102 (-157.0796, 106.4587) -> (-171.0796, 106.4587) centre (-164.0796, 106.4587) ccw
  line L267 (-157.0796, 106.4587) -> (-157.0796, 100)
  arc A103 (-157.0796, 306.4587) -> (-171.0796, 306.4587) centre (-164.0796, 306.4587) ccw
  line L268 (-157.0796, 306.4587) -> (-157.0796, 300)
  arc A104 (-157.0796, 506.4587) -> (-171.0796, 506.4587) centre (-164.0796, 506.4587) ccw
  line L269 (-157.0796, 506.4587) -> (-157.0796, 500)
  arc A105 (-457.0796, 106.4587) -> (-471.0796, 106.4587) centre (-464.0796, 106.4587) ccw
  line L270 (-457.0796, 106.4587) -> (-457.0796, 100)
  arc A106 (-457.0796, 306.4587) -> (-471.0796, 306.4587) centre (-464.0796, 306.4587) ccw
  line L271 (-457.0796, 306.4587) -> (-457.0796, 300)
  arc A107 (-457.0796, 506.4587) -> (-471.0796, 506.4587) centre (-464.0796, 506.4587) ccw construction
  line L272 (-457.0796, 506.4587) -> (-457.0796, 500) construction
  point P0 (158.3765, 0)
  point P1 (-148.021, 75)
  point P2 (-128.5398, 50)
  point P3 (-95.6611, 25)
  point P4 (-51.1799, 6.6987)
  point P5 (-155.8997, 93.3013)
  point P6 (-148.021, 275)
  point P7 (-128.5398, 250)
  point P8 (-95.6611, 225)
  point P9 (-51.1799, 206.6987)
  point P10 (-157.0796, 303.4587)
  point P11 (-157.0796, 200)
  point P12 (-171.0796, 303.4587)
  point P13 (-6, 188.1567)
  point P14 (-142.7917, 285.4273)
  point P15 (-148.021, 475)
  point P16 (-128.5398, 450)
  point P17 (-95.6611, 425)
  point P18 (-51.1799, 406.6987)
  point P19 (-157.0796, 503.4587)
  point P20 (-157.0796, 400)
  point P21 (-171.0796, 503.4587)
  point P22 (-6, 388.1567)
  point P23 (-142.7917, 485.4273)
  point P24 (-448.021, 75)
  point P25 (-428.5398, 50)
  point P26 (-395.6611, 25)
  point P27 (-351.1799, 6.6987)
  point P28 (-457.0796, 103.4587)
  point P29 (-457.0796, 0)
  point P30 (-471.0796, 103.4587)
  point P31 (-306, -11.8433)
  point P32 (-442.7917, 85.4273)
  point P33 (-448.021, 275)
  point P34 (-428.5398, 250)
  point P35 (-395.6611, 225)
  point P36 (-351.1799, 206.6987)
  point P37 (-457.0796, 303.4587)
  point P38 (-457.0796, 200)
  point P39 (-471.0796, 303.4587)
  point P40 (-306, 188.1567)
  point P41 (-442.7917, 285.4273)
  point P42 (-448.021, 475)
  point P43 (-428.5398, 450)
  point P44 (-395.6611, 425)
  point P45 (-351.1799, 406.6987)
  point P46 (-457.0796, 503.4587)
  point P47 (-457.0796, 400)
  point P48 (-471.0796, 503.4587)
  point P49 (-306, 388.1567)
  point P50 (-442.7917, 485.4273)
  point P51 (-421.2258, 50.7726)
  point P52 (-392.6255, 29.6644)
  point P53 (-346.6709, 11.6004)
  point P54 (-436.0267, 68.102)
  point P55 (-457.0796, 503.4587)
  point P56 (-504.6796, 390.1567)
  point P57 (-606, 188.1567)
  point P58 (-757.0796, 200)
  point P59 (-748.021, 275)
  point P60 (-728.5398, 250)
  point P61 (-757.0796, 303.4587)
  point P62 (-695.6611, 225)
  point P63 (-651.1799, 206.6987)
  point P64 (-742.7917, 285.4273)
  point P65 (-771.0796, 303.4587)
  point P66 (-804.6796, 190.1567)
  point P67 (-564.55, 188.1567)
  point P68 (-554.95, 190.1567)
  point P69 (-254.95, 390.1567)
  dimension "d43" = 25.75
  dimension "diameter" = 100
  dimension "d8" = 26.1799
  dimension "d14" = 30
  dimension "d15" = 30
  dimension "d16" = 30
  dimension "d32" = 10.625
  dimension "d47" = 8
  dimension "d49" = 2
  dimension "d53" = 21.25
  dimension "d62" = 20.825
  dimension "d123" = 120
  dimension "d126" = 59.109
  dimension "d137" = 2
  dimension "d138" = 90
  dimension "d139" = 90
  dimension "d141" = 7.1
  dimension "d142" = 14
  dimension "d143" = 7.1
  dimension "d144" = 12
  dimension "d145" = 5
  dimension "d146" = 35
  dimension "d147" = 24
  dimension "hole" = 4
  dimension "d155" = 4
  dimension "d156" = 9
  dimension "d157" = 4
  dimension "d158" = 6
  dimension "d159" = 4
  dimension "d160" = 4
  dimension "d241" = 120.891
  dimension "d244" = 120
  dimension "d245" = 30
  dimension "d246" = 3
  dimension "d249" = 200
  dimension "d252" = 300
  dimension "d255" = 120
  dimension "d256" = 5.1701
  dimension "d259" = 0.5
  dimension "d260" = 0.5
  dimension "d261" = 120
  dimension "d262" = 120
  dimension "d264" = 5.1701
  dimension "d265" = 38
  dimension "d268" = 300
  dimension "d275" = 200
  dimension "d288" = 5.1701
  dimension "d289" = 5.1701
  dimension "d290" = 5.1701
  dimension "d291" = 5.1701
  dimension "d292" = 11.2
  dimension "d293" = 4
  dimension "d294" = 4
  dimension "d296" = 3
  dimension "d299" = 300
  dimension "d324" = 11.2
  dimension "d325" = 4
  dimension "d326" = 4
  dimension "d328" = 3
  dimension "d330" = 4
  dimension "d331" = 10
  dimension "d332" = 10
  dimension "d335" = 200
  dimension "d338" = 300
  dimension "d341" = 7.1
  dimension "d342" = 4.6
sketch "Sketch5" plane through (0, 0, 0) normal (0, 0, 1) x (1, 0, 0)
  circle A0 centre (-171.0796, 114.7323) radius 2
  arc A1 (-168.5126, 119.023) -> (-173.6466, 110.4415) centre (-171.0796, 114.7323) ccw construction
  line L0 (-173.6466, 110.4415) -> (-168.5126, 119.023) construction
  line L1 (-137.3368, 94.5451) -> (-171.0796, 114.7323) construction
  line L2 (-137.3368, 94.5451) -> (-143.2815, 84.6085) construction
  line L3 (-141.0754, 84.4005) -> (-135.6205, 93.5183) construction
  line L4 (-142.7917, 85.4273) -> (-141.0754, 84.4005) construction
  line L5 (-173.6466, 110.4415) -> (-138.1875, 89.2276) construction
  line L6 (-138.1875, 89.2276) -> (-133.0535, 97.8091)
  line L7 (-133.0535, 97.8091) -> (-168.5126, 119.023) construction
  line L8 (-159.6382, 113.7138) -> (-159.6382, 107.8873)
  line L9 (-159.6382, 107.8873) -> (-145.3456, 99.3365)
  line L10 (-133.0535, 97.8091) -> (-140.2116, 102.0915)
  line L11 (-152.4919, 103.6119) -> (-153.6918, 101.6062)
  line L12 (-140.2116, 102.0915) -> (-145.3456, 99.3365)
  line L13 (-159.6382, 113.7138) -> (-168.5126, 119.023)
  line L14 (-135.6205, 93.5183) -> (-169.3633, 113.7055) construction
  line L15 (-168.5126, 119.023) -> (-189.9664, 131.858)
  arc A2 (-189.9664, 131.858) -> (-195.1004, 123.2766) centre (-192.5334, 127.5673) ccw
  line L16 (-195.1004, 123.2766) -> (-173.6466, 110.4415)
  line L17 (-142.7917, 85.4273) -> (-141.0754, 84.4005)
  line L18 (-141.0754, 84.4005) -> (-138.1875, 89.2276)
  line L19 (-142.7917, 85.4273) -> (-142.6907, 91.9217)
  line L20 (-142.6907, 91.9217) -> (-173.6466, 110.4415)
  arc A3 (-141.0754, 84.4005) -> (-138.014, 141.6941) centre (-171.0796, 114.7323) ccw construction
  point P0 (0, 0)
  dimension "d346" = 4
  dimension "d347" = 3
  dimension "d356" = 25
  dimension "d357" = 120
extrude "Extrusion5" add sketch "Sketch3" along normal blind 3 contours L31 A16 L32 L33 L36 A8 | A7 L35 L34 L65 A15 L64 L60 L62 A102 L267 S0
properties part number "3cycloidpath"
